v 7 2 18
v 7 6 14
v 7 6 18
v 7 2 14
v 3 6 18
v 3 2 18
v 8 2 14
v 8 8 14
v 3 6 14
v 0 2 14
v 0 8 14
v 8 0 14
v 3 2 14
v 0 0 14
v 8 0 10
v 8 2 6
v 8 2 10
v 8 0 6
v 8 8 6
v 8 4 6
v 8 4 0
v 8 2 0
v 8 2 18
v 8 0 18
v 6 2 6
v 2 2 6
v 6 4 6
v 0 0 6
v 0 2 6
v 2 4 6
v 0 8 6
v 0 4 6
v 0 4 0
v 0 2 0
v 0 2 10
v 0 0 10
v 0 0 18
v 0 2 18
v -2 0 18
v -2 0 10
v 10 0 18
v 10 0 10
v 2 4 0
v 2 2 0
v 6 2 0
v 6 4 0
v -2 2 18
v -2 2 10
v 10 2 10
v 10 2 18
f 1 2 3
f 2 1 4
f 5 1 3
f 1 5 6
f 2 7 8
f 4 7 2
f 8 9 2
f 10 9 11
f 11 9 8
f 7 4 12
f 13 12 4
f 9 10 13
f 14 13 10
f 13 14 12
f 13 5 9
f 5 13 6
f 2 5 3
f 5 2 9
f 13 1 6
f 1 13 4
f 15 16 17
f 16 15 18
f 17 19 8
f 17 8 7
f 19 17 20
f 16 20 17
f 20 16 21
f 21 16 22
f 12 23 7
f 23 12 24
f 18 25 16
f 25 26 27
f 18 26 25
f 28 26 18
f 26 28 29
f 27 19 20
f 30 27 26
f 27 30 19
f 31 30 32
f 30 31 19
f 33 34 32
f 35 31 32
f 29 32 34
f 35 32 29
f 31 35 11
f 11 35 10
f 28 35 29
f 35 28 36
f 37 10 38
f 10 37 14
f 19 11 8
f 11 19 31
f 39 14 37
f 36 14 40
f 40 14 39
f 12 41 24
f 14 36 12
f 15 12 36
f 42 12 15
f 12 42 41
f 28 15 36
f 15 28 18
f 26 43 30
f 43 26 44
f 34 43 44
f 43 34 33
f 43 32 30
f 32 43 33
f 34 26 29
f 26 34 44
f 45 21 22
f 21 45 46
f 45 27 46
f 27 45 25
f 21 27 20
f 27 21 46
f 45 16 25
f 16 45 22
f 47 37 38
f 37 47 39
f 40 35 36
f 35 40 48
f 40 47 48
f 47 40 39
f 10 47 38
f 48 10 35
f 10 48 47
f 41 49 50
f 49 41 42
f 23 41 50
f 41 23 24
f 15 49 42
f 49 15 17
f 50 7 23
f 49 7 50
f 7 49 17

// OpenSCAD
// file: ../../../shapes/minecraft/copper-golem/copper-golem.scad
module copperGolem()
{
    // Head
    translate([2, 2, 14])
    {
        color("orange")
        cube([4, 4, 4]);
    }

    // Body
    translate([0, 0, 6])
    {
        color("green")
        cube([8, 8, 8]);
    }

    // Legs
    translate([0, 2, 0])
    {
        color("pink")
        cube([2, 2, 8]);
    }

    translate([6, 2, 0])
    {
        color("pink")
        cube([2, 2, 8]);
    }

    // Arms
    translate([-2, 0, 10])
    {
        color("red")
        cube([2, 2, 8]);
    }

    translate([8, 0, 10])
    {
        color("red")
        cube([2, 2, 8]);
    }

    // Eyes
    translate([2, 2, 8])
    {
        color("white")
        cube([2, 2, 2]);
    }

    translate([4, 2, 8])
    {
        color("white")
        cube([2, 2, 2]);
    }
}
// main file
use <../../../shapes/minecraft/copper-golem/copper-golem.scad>

rotate ([0, 0, $t*360])
copperGolem();



// animation settings:
//    FPS: 20
//    Steps: 100
